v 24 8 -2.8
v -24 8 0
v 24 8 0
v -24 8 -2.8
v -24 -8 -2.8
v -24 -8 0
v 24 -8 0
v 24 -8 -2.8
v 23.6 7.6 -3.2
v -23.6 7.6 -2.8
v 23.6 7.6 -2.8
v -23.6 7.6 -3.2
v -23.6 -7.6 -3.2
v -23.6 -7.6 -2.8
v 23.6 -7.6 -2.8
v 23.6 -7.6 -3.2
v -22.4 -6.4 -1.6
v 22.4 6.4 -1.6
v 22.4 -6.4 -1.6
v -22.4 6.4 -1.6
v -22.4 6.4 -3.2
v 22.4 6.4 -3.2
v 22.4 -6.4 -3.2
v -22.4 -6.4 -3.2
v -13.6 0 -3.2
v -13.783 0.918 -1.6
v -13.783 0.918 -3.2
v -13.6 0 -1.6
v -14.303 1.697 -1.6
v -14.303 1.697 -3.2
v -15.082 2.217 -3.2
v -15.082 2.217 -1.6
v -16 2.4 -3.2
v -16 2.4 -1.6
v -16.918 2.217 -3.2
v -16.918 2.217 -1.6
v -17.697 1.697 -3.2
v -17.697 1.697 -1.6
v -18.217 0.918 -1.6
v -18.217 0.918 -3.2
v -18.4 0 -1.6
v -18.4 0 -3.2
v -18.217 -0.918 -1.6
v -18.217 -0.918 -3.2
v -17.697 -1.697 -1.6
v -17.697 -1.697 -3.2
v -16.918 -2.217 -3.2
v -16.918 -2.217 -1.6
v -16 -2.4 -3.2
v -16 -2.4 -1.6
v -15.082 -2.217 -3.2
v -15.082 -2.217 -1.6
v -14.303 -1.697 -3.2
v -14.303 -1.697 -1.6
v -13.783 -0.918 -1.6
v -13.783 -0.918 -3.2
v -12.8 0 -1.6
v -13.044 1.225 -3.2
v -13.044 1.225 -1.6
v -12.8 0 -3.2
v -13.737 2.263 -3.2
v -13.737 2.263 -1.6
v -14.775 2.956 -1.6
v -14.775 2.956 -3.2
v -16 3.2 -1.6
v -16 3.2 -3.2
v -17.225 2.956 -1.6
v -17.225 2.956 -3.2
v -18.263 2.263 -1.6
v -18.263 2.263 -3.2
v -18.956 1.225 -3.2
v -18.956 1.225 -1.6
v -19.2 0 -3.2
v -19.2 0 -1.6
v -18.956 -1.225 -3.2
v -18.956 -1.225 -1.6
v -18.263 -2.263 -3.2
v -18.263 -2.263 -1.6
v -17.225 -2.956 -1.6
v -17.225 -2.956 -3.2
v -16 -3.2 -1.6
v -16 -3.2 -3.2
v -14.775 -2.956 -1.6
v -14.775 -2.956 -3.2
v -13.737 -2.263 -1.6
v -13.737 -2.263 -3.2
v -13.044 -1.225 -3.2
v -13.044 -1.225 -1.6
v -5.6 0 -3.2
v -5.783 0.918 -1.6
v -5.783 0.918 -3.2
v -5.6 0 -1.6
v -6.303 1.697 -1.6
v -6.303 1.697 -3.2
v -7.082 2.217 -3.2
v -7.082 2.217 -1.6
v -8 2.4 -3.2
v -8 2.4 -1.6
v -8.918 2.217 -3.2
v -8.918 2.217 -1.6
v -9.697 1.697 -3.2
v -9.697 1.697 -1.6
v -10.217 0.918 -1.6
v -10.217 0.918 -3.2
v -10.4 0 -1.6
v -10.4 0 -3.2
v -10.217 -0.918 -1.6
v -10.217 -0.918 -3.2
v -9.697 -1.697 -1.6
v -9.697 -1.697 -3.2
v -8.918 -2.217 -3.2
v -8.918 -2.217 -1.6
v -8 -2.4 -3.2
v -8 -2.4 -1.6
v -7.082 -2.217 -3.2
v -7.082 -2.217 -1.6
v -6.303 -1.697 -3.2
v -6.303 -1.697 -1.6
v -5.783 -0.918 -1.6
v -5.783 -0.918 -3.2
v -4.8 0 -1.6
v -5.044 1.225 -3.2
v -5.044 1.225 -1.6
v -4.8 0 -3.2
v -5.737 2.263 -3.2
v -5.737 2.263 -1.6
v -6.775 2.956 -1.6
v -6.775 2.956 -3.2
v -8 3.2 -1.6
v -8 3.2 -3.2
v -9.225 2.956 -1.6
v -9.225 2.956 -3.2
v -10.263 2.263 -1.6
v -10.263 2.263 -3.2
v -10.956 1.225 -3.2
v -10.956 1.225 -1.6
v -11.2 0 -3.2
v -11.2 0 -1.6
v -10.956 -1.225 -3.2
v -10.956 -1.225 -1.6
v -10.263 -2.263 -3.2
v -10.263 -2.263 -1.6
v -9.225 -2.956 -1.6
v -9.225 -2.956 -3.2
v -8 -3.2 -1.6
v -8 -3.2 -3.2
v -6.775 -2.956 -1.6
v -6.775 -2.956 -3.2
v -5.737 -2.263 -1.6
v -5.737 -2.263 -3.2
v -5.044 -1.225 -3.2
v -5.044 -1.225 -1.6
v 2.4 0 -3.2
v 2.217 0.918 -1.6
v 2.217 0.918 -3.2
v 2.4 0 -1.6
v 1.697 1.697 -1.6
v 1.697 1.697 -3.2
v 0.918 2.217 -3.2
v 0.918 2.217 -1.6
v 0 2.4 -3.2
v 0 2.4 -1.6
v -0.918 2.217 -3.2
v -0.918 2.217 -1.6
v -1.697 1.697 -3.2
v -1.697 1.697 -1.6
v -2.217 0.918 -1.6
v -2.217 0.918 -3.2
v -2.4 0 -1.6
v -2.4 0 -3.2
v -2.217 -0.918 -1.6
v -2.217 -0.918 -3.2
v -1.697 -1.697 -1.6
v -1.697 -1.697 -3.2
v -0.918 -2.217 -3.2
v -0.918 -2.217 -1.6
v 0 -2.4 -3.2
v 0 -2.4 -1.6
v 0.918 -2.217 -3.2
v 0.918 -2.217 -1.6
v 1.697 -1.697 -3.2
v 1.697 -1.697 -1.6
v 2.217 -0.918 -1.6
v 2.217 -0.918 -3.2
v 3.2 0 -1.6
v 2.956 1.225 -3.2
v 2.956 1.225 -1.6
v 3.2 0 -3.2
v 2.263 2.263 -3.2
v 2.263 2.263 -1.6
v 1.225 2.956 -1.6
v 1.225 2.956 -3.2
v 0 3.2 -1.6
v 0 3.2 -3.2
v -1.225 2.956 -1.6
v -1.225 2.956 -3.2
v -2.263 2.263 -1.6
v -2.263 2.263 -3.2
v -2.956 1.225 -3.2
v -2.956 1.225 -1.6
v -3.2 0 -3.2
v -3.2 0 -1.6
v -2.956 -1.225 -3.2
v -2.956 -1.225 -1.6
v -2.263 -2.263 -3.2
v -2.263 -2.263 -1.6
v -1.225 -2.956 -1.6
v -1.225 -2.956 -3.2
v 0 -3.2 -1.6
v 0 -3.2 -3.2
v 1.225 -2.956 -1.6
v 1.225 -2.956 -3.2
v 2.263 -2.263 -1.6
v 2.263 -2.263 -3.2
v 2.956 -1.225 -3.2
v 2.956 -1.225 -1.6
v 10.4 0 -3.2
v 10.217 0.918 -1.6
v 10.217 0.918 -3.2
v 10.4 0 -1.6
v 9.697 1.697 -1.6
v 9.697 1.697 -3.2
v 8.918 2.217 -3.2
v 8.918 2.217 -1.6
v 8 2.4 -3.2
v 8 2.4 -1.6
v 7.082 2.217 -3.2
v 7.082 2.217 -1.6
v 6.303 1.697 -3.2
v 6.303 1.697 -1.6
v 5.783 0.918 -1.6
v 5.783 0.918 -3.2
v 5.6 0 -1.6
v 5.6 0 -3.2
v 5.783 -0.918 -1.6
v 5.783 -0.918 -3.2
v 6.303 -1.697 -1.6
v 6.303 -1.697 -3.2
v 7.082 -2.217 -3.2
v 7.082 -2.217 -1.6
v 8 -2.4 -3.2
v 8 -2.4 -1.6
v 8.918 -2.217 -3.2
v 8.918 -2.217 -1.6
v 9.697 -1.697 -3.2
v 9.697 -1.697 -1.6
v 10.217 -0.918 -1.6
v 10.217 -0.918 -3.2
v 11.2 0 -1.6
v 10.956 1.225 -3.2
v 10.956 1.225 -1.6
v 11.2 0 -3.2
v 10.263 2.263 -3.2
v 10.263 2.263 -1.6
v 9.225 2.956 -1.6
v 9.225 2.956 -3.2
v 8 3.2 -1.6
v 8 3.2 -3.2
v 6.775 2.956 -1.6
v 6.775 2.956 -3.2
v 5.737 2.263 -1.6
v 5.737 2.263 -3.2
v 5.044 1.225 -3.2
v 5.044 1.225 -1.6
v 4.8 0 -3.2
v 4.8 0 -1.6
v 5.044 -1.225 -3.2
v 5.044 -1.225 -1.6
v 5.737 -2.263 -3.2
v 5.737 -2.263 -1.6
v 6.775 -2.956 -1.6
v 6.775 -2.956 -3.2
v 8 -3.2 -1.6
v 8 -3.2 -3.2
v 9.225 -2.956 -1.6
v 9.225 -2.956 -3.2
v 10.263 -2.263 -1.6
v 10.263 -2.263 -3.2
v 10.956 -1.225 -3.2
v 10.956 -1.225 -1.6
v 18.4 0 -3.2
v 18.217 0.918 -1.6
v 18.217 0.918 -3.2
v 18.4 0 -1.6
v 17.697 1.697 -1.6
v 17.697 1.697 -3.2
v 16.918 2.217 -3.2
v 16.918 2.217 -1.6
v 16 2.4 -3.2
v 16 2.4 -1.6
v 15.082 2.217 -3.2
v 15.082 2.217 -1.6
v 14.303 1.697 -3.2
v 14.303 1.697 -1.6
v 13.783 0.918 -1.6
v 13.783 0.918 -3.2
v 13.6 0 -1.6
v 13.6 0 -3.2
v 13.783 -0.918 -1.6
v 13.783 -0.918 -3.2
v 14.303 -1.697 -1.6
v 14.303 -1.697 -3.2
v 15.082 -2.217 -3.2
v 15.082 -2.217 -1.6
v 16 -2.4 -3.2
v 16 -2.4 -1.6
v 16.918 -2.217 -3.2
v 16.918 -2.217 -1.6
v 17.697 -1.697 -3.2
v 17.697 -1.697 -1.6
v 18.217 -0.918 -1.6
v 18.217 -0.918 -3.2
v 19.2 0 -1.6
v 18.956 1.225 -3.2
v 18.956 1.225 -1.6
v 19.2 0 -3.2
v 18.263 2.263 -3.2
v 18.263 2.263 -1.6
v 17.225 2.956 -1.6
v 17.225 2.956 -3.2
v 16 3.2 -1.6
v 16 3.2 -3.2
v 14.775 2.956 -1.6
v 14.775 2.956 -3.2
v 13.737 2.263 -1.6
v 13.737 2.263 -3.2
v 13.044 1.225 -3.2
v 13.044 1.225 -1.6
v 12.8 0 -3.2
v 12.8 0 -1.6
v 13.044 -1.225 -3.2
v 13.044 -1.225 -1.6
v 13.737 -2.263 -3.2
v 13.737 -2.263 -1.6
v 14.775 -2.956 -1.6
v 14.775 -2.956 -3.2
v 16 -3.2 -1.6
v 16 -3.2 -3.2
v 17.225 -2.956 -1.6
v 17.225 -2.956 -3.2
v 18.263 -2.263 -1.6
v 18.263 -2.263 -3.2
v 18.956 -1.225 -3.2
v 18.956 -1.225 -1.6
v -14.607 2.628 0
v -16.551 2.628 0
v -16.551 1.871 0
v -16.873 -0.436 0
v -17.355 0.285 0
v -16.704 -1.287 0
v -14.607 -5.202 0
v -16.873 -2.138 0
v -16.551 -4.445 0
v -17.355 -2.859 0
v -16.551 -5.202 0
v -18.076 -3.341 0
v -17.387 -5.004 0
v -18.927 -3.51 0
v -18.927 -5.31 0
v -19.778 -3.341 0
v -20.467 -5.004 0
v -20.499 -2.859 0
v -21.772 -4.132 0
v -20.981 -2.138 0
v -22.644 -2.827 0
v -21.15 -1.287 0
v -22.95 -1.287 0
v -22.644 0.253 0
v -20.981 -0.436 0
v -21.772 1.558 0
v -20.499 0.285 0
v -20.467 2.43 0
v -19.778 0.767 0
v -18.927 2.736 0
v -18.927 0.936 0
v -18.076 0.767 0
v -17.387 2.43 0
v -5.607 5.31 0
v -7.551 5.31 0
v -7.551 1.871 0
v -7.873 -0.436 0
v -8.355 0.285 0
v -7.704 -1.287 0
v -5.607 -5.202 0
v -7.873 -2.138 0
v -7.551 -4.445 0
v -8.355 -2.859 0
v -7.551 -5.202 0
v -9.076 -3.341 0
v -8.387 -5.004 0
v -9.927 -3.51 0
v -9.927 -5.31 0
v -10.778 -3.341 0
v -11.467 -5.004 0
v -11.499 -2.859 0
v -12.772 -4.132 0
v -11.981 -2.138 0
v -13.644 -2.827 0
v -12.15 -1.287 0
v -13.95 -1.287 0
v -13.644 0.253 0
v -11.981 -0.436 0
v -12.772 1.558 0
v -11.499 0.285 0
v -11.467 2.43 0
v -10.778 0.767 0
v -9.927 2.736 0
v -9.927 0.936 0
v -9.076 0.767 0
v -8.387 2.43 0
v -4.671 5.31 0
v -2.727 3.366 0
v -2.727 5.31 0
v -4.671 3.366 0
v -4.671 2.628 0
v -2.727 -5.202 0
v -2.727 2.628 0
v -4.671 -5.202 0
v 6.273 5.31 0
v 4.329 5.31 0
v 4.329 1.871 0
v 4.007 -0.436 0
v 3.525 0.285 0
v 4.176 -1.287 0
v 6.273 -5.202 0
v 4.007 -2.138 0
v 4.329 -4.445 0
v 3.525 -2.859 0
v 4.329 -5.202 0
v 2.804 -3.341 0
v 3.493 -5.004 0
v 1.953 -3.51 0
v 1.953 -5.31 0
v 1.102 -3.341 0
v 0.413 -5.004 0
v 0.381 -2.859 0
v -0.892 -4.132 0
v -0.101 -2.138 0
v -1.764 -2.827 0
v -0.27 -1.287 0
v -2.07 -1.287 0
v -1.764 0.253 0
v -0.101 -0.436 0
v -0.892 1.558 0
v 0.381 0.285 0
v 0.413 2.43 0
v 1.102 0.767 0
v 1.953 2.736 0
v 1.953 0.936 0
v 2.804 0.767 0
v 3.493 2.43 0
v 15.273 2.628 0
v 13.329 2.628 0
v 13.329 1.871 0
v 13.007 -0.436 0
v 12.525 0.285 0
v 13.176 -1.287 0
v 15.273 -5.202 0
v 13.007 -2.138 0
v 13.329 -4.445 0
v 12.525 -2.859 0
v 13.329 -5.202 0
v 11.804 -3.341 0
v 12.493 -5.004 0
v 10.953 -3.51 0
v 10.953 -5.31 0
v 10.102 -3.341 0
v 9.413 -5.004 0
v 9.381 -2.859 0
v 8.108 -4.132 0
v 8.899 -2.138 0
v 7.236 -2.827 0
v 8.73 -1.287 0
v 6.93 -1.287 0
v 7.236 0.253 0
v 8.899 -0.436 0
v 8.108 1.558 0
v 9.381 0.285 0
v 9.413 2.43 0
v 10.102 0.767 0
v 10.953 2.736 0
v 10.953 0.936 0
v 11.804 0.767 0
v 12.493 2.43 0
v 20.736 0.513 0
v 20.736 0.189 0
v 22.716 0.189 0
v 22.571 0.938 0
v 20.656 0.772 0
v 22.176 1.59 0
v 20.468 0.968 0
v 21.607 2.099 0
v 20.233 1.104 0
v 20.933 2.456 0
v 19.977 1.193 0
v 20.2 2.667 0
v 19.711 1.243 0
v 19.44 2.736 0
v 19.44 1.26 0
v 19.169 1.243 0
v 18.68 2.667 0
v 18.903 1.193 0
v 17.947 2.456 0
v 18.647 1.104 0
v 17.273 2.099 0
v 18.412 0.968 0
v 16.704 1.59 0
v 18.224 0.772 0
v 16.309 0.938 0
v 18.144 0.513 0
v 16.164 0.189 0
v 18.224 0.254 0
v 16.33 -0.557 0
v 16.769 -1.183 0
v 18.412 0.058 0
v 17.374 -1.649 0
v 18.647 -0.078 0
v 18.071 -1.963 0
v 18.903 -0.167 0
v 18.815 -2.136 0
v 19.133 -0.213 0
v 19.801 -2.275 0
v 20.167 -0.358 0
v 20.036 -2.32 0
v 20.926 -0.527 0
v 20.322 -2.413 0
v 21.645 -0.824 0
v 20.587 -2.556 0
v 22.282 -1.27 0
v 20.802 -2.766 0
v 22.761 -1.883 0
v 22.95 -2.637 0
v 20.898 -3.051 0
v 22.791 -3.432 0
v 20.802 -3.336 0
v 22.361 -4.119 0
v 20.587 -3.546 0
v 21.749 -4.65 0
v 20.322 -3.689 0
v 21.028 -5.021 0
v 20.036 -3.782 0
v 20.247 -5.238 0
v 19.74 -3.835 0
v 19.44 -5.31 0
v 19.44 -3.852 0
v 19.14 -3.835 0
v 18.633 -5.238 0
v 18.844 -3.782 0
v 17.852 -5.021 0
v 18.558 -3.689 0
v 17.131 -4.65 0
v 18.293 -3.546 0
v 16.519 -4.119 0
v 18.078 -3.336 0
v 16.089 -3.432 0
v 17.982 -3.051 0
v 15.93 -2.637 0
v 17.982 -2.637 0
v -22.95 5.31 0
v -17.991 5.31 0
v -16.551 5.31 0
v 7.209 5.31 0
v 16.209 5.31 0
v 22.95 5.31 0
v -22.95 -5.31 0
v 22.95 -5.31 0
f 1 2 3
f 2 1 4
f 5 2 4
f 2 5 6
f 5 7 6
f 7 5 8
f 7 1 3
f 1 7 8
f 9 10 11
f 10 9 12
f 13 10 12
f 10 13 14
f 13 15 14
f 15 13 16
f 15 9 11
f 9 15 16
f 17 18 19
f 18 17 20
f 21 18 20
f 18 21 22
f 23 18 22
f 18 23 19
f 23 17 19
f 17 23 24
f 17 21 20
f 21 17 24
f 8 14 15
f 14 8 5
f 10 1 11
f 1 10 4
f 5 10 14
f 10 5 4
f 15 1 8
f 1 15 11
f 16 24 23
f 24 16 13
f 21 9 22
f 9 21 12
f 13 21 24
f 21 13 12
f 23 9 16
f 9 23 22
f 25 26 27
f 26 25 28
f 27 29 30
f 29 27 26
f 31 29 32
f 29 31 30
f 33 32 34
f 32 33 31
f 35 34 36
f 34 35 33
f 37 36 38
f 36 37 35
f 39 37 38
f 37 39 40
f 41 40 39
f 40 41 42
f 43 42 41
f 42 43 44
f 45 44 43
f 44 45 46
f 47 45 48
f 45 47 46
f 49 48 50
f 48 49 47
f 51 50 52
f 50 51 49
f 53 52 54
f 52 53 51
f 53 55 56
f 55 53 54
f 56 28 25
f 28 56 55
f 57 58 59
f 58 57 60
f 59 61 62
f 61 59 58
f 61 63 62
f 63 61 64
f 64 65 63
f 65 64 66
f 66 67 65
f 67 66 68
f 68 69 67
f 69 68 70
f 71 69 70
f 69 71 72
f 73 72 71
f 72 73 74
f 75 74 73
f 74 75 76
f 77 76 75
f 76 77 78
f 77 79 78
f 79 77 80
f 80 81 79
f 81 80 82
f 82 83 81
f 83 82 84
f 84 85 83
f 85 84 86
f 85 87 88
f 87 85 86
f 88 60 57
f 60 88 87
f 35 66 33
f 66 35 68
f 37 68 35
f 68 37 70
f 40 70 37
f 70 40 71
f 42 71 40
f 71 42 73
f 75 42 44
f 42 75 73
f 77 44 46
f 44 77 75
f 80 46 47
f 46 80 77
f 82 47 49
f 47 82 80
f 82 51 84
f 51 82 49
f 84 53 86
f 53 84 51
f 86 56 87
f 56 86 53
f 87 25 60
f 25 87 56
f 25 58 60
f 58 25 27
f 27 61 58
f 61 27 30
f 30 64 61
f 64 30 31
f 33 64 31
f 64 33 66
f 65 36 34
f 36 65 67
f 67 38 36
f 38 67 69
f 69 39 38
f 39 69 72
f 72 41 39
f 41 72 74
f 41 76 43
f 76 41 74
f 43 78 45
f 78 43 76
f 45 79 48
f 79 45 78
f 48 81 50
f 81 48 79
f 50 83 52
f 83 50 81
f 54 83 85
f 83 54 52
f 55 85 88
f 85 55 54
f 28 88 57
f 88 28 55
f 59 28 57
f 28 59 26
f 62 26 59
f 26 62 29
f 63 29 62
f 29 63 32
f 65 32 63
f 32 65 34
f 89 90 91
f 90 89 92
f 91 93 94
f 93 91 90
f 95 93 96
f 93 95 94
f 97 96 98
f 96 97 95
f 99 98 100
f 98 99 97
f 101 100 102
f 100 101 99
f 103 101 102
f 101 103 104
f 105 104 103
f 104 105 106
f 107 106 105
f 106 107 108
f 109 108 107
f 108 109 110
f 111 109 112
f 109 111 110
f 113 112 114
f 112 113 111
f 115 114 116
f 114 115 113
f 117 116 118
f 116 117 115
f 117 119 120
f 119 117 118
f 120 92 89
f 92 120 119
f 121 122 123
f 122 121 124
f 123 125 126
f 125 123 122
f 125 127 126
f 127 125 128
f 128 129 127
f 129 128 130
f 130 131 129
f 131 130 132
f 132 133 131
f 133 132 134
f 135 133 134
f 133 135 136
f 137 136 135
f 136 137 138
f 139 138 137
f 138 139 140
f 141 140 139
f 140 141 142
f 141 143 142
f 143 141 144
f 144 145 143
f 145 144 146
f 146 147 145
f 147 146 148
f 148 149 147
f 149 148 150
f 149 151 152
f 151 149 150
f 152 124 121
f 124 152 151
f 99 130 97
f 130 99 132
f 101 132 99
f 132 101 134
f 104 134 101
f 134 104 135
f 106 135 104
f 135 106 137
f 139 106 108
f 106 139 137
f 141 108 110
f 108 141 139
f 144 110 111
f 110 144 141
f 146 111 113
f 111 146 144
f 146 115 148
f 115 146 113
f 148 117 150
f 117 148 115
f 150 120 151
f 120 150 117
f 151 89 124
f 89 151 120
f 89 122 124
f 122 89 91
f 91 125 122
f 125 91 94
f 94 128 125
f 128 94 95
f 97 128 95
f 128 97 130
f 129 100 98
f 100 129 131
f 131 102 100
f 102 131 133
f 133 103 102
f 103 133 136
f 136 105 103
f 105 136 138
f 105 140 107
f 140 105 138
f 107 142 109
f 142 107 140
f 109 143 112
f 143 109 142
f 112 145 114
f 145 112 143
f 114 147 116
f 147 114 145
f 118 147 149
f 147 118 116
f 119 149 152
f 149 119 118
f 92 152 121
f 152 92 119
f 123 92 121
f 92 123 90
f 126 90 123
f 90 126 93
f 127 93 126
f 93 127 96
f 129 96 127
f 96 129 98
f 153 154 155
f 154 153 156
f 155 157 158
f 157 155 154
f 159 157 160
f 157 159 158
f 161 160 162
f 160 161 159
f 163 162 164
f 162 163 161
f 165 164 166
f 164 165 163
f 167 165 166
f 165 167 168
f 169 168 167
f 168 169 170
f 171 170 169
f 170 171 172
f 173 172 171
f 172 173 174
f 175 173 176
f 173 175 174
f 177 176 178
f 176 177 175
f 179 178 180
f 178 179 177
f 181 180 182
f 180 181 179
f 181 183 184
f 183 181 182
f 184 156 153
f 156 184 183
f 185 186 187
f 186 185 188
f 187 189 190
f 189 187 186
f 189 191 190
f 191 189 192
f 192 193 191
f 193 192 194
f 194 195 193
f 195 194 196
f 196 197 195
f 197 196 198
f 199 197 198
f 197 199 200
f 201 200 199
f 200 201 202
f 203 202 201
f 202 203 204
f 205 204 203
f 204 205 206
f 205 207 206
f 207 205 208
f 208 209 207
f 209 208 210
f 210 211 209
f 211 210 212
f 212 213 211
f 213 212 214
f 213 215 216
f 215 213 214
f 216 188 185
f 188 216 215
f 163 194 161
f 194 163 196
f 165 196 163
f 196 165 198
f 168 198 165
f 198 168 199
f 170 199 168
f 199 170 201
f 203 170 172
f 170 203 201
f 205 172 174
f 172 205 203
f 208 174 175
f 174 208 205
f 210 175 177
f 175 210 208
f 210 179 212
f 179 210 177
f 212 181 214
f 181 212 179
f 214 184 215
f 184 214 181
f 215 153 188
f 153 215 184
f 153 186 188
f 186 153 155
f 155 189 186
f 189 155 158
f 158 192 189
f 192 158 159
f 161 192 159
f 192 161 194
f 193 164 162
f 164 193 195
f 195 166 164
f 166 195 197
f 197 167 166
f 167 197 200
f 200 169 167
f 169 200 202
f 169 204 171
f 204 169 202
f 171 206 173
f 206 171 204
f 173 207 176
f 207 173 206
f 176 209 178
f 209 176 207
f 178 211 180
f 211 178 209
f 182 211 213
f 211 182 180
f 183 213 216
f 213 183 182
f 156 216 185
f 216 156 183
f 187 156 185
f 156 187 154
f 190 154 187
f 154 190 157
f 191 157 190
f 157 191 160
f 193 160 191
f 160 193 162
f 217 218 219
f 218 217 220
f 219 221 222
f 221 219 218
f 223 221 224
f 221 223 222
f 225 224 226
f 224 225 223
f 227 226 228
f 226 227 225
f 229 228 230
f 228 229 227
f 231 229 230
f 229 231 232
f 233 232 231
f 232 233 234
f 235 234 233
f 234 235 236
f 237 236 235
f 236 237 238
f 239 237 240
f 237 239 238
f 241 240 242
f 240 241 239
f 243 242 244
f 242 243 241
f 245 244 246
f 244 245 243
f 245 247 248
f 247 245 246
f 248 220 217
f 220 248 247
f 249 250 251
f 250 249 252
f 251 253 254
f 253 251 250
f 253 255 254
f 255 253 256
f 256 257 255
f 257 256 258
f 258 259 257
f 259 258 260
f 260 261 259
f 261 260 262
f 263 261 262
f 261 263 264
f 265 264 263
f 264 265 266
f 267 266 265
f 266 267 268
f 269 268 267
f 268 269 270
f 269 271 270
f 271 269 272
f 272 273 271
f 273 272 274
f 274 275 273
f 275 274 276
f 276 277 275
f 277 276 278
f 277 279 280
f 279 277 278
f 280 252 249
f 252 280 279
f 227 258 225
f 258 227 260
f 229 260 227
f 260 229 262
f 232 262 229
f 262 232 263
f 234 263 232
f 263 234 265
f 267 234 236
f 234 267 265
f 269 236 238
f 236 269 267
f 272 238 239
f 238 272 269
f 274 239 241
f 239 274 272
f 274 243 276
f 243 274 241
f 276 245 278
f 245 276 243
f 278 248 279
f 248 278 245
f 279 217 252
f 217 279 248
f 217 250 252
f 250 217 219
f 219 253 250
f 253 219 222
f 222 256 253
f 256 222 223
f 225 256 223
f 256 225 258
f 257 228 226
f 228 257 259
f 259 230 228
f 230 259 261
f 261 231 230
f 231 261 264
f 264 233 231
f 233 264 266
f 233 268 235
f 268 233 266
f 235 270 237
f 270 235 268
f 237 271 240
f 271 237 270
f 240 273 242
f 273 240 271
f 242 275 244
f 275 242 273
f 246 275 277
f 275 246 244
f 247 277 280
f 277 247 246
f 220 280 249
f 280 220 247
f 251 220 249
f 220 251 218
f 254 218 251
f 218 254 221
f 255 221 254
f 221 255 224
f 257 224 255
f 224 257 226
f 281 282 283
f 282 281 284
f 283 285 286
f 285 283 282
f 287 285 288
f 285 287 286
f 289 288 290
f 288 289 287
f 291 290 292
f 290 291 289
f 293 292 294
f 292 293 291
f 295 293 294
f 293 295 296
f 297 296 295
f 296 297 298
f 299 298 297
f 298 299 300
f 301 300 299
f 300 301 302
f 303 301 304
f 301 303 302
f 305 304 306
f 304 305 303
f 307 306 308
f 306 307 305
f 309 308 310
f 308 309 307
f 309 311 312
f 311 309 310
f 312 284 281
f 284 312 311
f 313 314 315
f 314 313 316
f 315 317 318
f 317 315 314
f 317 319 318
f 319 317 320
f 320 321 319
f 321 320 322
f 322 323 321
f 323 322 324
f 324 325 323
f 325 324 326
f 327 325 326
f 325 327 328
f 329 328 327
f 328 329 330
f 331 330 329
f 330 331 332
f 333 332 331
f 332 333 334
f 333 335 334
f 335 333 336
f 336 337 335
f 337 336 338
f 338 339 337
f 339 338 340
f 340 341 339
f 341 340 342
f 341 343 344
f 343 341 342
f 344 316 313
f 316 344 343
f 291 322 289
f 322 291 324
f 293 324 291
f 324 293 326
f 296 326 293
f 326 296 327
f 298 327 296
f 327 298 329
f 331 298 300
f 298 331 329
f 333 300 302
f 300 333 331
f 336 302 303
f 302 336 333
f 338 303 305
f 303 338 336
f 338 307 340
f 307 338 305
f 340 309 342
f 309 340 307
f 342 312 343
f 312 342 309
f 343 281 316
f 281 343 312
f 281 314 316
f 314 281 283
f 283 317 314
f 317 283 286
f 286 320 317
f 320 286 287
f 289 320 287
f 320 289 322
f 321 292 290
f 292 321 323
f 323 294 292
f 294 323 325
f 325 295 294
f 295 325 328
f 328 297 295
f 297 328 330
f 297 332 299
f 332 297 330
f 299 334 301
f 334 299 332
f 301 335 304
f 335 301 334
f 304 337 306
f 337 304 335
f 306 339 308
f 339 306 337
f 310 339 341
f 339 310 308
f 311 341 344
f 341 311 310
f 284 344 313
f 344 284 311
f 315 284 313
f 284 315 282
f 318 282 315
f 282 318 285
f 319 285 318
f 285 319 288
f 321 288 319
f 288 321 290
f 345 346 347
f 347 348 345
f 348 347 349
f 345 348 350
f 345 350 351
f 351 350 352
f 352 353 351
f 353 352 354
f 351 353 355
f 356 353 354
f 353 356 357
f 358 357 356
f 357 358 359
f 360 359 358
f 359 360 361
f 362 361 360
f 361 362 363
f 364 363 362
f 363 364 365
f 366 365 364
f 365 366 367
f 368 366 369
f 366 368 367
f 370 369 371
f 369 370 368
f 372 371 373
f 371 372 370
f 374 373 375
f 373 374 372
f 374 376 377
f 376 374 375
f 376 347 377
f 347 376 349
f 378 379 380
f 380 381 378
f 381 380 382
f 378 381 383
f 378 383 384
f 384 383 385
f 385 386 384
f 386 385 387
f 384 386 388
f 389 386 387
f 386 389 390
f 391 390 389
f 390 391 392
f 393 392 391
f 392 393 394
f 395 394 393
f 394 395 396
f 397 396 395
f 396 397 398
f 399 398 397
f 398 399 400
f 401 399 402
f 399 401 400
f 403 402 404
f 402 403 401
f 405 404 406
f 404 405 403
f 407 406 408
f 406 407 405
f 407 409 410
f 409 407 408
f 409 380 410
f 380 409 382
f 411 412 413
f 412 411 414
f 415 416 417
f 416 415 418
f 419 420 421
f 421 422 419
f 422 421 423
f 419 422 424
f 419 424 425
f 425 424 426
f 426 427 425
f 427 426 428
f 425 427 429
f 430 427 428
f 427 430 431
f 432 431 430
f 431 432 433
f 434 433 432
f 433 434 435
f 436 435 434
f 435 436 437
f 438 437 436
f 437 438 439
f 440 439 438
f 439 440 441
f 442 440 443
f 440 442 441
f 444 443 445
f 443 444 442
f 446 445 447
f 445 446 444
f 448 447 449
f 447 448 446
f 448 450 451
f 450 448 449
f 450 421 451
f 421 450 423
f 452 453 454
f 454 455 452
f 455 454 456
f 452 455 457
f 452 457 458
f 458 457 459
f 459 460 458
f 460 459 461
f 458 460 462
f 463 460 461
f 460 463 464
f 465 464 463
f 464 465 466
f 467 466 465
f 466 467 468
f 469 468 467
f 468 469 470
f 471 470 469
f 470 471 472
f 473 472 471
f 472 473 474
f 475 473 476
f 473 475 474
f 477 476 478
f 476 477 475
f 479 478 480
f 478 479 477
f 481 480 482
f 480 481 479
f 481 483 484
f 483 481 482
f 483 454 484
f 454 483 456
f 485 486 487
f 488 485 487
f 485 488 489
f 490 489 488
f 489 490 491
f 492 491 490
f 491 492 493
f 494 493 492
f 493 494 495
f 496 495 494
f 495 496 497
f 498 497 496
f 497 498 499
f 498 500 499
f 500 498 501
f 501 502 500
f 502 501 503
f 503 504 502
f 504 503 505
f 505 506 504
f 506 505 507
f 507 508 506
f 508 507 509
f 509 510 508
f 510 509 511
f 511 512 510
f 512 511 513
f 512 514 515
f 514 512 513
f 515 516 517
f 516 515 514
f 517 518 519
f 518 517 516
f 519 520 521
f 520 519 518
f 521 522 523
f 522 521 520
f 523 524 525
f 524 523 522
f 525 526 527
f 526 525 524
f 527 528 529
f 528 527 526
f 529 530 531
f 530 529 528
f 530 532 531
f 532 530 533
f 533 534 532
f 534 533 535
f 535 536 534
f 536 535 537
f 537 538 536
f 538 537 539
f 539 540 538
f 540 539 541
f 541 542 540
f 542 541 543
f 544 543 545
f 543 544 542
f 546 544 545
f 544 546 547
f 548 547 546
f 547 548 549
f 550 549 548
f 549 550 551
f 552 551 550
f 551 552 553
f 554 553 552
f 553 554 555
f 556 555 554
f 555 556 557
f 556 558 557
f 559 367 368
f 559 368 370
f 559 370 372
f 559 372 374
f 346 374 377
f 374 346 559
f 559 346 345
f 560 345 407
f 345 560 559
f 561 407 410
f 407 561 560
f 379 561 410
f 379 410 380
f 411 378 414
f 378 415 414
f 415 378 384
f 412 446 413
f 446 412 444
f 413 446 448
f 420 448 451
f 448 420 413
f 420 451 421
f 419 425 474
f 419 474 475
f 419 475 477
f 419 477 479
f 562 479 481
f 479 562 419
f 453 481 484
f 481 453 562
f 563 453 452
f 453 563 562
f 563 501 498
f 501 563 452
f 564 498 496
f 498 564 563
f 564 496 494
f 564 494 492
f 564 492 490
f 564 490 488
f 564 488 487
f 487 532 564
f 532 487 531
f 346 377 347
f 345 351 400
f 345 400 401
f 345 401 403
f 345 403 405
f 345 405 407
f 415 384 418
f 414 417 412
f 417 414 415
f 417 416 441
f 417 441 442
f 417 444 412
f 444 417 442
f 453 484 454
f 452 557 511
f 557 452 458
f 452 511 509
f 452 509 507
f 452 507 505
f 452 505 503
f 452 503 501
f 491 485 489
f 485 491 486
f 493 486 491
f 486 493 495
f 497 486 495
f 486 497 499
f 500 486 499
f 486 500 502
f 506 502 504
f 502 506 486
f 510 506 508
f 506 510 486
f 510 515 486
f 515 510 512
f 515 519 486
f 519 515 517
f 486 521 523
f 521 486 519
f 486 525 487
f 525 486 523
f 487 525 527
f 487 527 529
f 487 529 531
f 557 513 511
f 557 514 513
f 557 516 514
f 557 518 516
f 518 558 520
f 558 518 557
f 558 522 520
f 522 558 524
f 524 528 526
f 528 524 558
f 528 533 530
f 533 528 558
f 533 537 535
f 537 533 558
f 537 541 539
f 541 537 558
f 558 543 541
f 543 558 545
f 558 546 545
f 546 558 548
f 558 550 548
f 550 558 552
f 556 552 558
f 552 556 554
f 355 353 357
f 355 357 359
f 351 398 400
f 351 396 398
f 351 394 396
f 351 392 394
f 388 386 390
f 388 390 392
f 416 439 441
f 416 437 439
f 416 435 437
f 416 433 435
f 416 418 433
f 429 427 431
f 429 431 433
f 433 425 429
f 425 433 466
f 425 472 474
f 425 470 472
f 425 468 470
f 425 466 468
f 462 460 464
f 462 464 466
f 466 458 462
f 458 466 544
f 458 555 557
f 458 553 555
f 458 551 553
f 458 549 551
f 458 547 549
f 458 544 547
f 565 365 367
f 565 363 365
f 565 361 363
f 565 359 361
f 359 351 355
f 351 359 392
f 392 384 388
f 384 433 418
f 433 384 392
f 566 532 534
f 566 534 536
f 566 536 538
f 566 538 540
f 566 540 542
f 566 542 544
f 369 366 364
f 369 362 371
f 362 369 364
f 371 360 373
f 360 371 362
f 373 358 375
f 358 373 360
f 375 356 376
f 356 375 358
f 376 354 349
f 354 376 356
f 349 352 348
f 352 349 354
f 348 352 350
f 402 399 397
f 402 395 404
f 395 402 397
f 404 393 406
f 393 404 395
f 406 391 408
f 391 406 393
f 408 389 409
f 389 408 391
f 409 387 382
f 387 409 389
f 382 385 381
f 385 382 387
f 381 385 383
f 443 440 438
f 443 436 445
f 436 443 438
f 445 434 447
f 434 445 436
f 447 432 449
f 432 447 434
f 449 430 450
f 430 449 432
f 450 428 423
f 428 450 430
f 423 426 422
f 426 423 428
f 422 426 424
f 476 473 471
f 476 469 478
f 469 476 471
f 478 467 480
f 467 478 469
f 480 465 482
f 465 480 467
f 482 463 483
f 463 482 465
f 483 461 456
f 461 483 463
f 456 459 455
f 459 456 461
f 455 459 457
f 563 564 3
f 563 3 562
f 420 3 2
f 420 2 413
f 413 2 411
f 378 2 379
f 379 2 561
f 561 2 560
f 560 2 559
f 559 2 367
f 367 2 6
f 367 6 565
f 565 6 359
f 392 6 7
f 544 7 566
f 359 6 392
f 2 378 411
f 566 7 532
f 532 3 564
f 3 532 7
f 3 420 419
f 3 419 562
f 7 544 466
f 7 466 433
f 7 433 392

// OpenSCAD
use <../lib.scad>
use <../p/logo-adidas-text-box.scad>
use <../p/logo-adidas-text.scad>
use <s/69729s01.scad>
function ldraw_lib__69729p07() = [
// 0 Tile  2 x  6 with Black "adidas" Text Pattern
// 0 Name: 69729p07.dat
// 0 Author: Gabriel Läufer [Dr.Bricktacular]
// 0 !LDRAW_ORG Part UPDATE 2026-05
// 0 !LICENSE Licensed under CC BY 4.0 : see CAreadme.txt
// 
// 0 BFC CERTIFY CCW
  [0,"BFC","CERTIFY"],
  [0,"BFC","CCW"],
// 
// 0 !KEYWORDS Adidas Originals Superstar, Bricklink 69729pb007, Brickowl 9015
// 0 !KEYWORDS Brickset 76314, Rebrickable 69729pr0001, Sculptures, Set 10282
// 
// 0 !HISTORY 2026-05-31 [OrionP] Official Update 2026-05
// 
// 0 // Pattern-Basepart
// 1 16 0 0 0 1 0 0 0 1 0 0 0 1 s\69729s01.dat
  [1,16,0,0,0,1,0,0,0,1,0,0,0,1, ldraw_lib__s__69729s01()],
// 
// 0 // Pattern
// 1 0 0 0 0 4.5 0 0 0 1 0 0 0 4.5 logo-adidas-text.dat
  [1,0,0,0,0,4.5,0,0,0,1,0,0,0,4.5, ldraw_lib__logo_adidas_text()],
// 1 16 0 0 0 4.5 0 0 0 1 0 0 0 4.5 logo-adidas-text-box.dat
  [1,16,0,0,0,4.5,0,0,0,1,0,0,0,4.5, ldraw_lib__logo_adidas_text_box()],
// 3 16 40.5225 0 13.275 57.375 0 13.275 60 0 20
  [3,16,40.5225,0,13.275,57.375,0,13.275,60,0,20],
// 3 16 40.5225 0 13.275 60 0 20 18.0225 0 13.275
  [3,16,40.5225,0,13.275,60,0,20,18.0225,0,13.275],
// 3 16 10.8225 0 13.275 60 0 20 -60 0 20
  [3,16,10.8225,0,13.275,60,0,20,-60,0,20],
// 3 16 10.8225 0 13.275 -60 0 20 -6.8175 0 13.275
  [3,16,10.8225,0,13.275,-60,0,20,-6.8175,0,13.275],
// 3 16 -6.8175 0 13.275 -60 0 20 -11.6775 0 13.275
  [3,16,-6.8175,0,13.275,-60,0,20,-11.6775,0,13.275],
// 3 16 -14.0175 0 13.275 -60 0 20 -18.8775 0 13.275
  [3,16,-14.0175,0,13.275,-60,0,20,-18.8775,0,13.275],
// 3 16 -18.8775 0 13.275 -60 0 20 -41.3775 0 13.275
  [3,16,-18.8775,0,13.275,-60,0,20,-41.3775,0,13.275],
// 3 16 -41.3775 0 13.275 -60 0 20 -44.9775 0 13.275
  [3,16,-41.3775,0,13.275,-60,0,20,-44.9775,0,13.275],
// 3 16 -44.9775 0 13.275 -60 0 20 -57.375 0 13.275
  [3,16,-44.9775,0,13.275,-60,0,20,-57.375,0,13.275],
// 3 16 -57.375 0 13.275 -60 0 20 -57.375 0 -3.2175
  [3,16,-57.375,0,13.275,-60,0,20,-57.375,0,-3.2175],
// 3 16 -57.375 0 -3.2175 -60 0 20 -60 0 -20
  [3,16,-57.375,0,-3.2175,-60,0,20,-60,0,-20],
// 3 16 -57.375 0 -3.2175 -60 0 -20 -57.375 0 -13.275
  [3,16,-57.375,0,-3.2175,-60,0,-20,-57.375,0,-13.275],
// 3 16 -57.375 0 -13.275 -60 0 -20 -47.3175 0 -13.275
  [3,16,-57.375,0,-13.275,-60,0,-20,-47.3175,0,-13.275],
// 3 16 -24.8175 0 -13.275 -60 0 -20 60 0 -20
  [3,16,-24.8175,0,-13.275,-60,0,-20,60,0,-20],
// 3 16 48.6 0 -13.275 60 0 -20 57.375 0 -13.275
  [3,16,48.6,0,-13.275,60,0,-20,57.375,0,-13.275],
// 3 16 -47.3175 0 -13.275 -60 0 -20 -24.8175 0 -13.275
  [3,16,-47.3175,0,-13.275,-60,0,-20,-24.8175,0,-13.275],
// 3 16 -60 0 20 -14.0175 0 13.275 -11.6775 0 13.275
  [3,16,-60,0,20,-14.0175,0,13.275,-11.6775,0,13.275],
// 3 16 57.375 0 -13.275 60 0 -20 57.375 0 -6.5925
  [3,16,57.375,0,-13.275,60,0,-20,57.375,0,-6.5925],
// 4 16 60 0 20 57.375 0 13.275 57.375 0 -6.5925 60 0 -20
  [4,16,60,0,20,57.375,0,13.275,57.375,0,-6.5925,60,0,-20],
// 3 16 60 0 20 10.8225 0 13.275 15.6825 0 13.275
  [3,16,60,0,20,10.8225,0,13.275,15.6825,0,13.275],
// 3 16 60 0 20 15.6825 0 13.275 18.0225 0 13.275
  [3,16,60,0,20,15.6825,0,13.275,18.0225,0,13.275],
// 3 16 60 0 -20 48.6 0 -13.275 27.3825 0 -13.275
  [3,16,60,0,-20,48.6,0,-13.275,27.3825,0,-13.275],
// 3 16 60 0 -20 27.3825 0 -13.275 4.8825 0 -13.275
  [3,16,60,0,-20,27.3825,0,-13.275,4.8825,0,-13.275],
// 3 16 60 0 -20 4.8825 0 -13.275 -24.8175 0 -13.275
  [3,16,60,0,-20,4.8825,0,-13.275,-24.8175,0,-13.275],
];
module ldraw_lib__69729p07(step=0, col=false, unit=2/5, alt=false, line=0.2, solid=!$preview)
    makepoly(ldraw_lib__69729p07(), step=step, col=col, unit=unit, alt=alt, line=line, solid=solid);
ldraw_lib__69729p07(line=0.2);
